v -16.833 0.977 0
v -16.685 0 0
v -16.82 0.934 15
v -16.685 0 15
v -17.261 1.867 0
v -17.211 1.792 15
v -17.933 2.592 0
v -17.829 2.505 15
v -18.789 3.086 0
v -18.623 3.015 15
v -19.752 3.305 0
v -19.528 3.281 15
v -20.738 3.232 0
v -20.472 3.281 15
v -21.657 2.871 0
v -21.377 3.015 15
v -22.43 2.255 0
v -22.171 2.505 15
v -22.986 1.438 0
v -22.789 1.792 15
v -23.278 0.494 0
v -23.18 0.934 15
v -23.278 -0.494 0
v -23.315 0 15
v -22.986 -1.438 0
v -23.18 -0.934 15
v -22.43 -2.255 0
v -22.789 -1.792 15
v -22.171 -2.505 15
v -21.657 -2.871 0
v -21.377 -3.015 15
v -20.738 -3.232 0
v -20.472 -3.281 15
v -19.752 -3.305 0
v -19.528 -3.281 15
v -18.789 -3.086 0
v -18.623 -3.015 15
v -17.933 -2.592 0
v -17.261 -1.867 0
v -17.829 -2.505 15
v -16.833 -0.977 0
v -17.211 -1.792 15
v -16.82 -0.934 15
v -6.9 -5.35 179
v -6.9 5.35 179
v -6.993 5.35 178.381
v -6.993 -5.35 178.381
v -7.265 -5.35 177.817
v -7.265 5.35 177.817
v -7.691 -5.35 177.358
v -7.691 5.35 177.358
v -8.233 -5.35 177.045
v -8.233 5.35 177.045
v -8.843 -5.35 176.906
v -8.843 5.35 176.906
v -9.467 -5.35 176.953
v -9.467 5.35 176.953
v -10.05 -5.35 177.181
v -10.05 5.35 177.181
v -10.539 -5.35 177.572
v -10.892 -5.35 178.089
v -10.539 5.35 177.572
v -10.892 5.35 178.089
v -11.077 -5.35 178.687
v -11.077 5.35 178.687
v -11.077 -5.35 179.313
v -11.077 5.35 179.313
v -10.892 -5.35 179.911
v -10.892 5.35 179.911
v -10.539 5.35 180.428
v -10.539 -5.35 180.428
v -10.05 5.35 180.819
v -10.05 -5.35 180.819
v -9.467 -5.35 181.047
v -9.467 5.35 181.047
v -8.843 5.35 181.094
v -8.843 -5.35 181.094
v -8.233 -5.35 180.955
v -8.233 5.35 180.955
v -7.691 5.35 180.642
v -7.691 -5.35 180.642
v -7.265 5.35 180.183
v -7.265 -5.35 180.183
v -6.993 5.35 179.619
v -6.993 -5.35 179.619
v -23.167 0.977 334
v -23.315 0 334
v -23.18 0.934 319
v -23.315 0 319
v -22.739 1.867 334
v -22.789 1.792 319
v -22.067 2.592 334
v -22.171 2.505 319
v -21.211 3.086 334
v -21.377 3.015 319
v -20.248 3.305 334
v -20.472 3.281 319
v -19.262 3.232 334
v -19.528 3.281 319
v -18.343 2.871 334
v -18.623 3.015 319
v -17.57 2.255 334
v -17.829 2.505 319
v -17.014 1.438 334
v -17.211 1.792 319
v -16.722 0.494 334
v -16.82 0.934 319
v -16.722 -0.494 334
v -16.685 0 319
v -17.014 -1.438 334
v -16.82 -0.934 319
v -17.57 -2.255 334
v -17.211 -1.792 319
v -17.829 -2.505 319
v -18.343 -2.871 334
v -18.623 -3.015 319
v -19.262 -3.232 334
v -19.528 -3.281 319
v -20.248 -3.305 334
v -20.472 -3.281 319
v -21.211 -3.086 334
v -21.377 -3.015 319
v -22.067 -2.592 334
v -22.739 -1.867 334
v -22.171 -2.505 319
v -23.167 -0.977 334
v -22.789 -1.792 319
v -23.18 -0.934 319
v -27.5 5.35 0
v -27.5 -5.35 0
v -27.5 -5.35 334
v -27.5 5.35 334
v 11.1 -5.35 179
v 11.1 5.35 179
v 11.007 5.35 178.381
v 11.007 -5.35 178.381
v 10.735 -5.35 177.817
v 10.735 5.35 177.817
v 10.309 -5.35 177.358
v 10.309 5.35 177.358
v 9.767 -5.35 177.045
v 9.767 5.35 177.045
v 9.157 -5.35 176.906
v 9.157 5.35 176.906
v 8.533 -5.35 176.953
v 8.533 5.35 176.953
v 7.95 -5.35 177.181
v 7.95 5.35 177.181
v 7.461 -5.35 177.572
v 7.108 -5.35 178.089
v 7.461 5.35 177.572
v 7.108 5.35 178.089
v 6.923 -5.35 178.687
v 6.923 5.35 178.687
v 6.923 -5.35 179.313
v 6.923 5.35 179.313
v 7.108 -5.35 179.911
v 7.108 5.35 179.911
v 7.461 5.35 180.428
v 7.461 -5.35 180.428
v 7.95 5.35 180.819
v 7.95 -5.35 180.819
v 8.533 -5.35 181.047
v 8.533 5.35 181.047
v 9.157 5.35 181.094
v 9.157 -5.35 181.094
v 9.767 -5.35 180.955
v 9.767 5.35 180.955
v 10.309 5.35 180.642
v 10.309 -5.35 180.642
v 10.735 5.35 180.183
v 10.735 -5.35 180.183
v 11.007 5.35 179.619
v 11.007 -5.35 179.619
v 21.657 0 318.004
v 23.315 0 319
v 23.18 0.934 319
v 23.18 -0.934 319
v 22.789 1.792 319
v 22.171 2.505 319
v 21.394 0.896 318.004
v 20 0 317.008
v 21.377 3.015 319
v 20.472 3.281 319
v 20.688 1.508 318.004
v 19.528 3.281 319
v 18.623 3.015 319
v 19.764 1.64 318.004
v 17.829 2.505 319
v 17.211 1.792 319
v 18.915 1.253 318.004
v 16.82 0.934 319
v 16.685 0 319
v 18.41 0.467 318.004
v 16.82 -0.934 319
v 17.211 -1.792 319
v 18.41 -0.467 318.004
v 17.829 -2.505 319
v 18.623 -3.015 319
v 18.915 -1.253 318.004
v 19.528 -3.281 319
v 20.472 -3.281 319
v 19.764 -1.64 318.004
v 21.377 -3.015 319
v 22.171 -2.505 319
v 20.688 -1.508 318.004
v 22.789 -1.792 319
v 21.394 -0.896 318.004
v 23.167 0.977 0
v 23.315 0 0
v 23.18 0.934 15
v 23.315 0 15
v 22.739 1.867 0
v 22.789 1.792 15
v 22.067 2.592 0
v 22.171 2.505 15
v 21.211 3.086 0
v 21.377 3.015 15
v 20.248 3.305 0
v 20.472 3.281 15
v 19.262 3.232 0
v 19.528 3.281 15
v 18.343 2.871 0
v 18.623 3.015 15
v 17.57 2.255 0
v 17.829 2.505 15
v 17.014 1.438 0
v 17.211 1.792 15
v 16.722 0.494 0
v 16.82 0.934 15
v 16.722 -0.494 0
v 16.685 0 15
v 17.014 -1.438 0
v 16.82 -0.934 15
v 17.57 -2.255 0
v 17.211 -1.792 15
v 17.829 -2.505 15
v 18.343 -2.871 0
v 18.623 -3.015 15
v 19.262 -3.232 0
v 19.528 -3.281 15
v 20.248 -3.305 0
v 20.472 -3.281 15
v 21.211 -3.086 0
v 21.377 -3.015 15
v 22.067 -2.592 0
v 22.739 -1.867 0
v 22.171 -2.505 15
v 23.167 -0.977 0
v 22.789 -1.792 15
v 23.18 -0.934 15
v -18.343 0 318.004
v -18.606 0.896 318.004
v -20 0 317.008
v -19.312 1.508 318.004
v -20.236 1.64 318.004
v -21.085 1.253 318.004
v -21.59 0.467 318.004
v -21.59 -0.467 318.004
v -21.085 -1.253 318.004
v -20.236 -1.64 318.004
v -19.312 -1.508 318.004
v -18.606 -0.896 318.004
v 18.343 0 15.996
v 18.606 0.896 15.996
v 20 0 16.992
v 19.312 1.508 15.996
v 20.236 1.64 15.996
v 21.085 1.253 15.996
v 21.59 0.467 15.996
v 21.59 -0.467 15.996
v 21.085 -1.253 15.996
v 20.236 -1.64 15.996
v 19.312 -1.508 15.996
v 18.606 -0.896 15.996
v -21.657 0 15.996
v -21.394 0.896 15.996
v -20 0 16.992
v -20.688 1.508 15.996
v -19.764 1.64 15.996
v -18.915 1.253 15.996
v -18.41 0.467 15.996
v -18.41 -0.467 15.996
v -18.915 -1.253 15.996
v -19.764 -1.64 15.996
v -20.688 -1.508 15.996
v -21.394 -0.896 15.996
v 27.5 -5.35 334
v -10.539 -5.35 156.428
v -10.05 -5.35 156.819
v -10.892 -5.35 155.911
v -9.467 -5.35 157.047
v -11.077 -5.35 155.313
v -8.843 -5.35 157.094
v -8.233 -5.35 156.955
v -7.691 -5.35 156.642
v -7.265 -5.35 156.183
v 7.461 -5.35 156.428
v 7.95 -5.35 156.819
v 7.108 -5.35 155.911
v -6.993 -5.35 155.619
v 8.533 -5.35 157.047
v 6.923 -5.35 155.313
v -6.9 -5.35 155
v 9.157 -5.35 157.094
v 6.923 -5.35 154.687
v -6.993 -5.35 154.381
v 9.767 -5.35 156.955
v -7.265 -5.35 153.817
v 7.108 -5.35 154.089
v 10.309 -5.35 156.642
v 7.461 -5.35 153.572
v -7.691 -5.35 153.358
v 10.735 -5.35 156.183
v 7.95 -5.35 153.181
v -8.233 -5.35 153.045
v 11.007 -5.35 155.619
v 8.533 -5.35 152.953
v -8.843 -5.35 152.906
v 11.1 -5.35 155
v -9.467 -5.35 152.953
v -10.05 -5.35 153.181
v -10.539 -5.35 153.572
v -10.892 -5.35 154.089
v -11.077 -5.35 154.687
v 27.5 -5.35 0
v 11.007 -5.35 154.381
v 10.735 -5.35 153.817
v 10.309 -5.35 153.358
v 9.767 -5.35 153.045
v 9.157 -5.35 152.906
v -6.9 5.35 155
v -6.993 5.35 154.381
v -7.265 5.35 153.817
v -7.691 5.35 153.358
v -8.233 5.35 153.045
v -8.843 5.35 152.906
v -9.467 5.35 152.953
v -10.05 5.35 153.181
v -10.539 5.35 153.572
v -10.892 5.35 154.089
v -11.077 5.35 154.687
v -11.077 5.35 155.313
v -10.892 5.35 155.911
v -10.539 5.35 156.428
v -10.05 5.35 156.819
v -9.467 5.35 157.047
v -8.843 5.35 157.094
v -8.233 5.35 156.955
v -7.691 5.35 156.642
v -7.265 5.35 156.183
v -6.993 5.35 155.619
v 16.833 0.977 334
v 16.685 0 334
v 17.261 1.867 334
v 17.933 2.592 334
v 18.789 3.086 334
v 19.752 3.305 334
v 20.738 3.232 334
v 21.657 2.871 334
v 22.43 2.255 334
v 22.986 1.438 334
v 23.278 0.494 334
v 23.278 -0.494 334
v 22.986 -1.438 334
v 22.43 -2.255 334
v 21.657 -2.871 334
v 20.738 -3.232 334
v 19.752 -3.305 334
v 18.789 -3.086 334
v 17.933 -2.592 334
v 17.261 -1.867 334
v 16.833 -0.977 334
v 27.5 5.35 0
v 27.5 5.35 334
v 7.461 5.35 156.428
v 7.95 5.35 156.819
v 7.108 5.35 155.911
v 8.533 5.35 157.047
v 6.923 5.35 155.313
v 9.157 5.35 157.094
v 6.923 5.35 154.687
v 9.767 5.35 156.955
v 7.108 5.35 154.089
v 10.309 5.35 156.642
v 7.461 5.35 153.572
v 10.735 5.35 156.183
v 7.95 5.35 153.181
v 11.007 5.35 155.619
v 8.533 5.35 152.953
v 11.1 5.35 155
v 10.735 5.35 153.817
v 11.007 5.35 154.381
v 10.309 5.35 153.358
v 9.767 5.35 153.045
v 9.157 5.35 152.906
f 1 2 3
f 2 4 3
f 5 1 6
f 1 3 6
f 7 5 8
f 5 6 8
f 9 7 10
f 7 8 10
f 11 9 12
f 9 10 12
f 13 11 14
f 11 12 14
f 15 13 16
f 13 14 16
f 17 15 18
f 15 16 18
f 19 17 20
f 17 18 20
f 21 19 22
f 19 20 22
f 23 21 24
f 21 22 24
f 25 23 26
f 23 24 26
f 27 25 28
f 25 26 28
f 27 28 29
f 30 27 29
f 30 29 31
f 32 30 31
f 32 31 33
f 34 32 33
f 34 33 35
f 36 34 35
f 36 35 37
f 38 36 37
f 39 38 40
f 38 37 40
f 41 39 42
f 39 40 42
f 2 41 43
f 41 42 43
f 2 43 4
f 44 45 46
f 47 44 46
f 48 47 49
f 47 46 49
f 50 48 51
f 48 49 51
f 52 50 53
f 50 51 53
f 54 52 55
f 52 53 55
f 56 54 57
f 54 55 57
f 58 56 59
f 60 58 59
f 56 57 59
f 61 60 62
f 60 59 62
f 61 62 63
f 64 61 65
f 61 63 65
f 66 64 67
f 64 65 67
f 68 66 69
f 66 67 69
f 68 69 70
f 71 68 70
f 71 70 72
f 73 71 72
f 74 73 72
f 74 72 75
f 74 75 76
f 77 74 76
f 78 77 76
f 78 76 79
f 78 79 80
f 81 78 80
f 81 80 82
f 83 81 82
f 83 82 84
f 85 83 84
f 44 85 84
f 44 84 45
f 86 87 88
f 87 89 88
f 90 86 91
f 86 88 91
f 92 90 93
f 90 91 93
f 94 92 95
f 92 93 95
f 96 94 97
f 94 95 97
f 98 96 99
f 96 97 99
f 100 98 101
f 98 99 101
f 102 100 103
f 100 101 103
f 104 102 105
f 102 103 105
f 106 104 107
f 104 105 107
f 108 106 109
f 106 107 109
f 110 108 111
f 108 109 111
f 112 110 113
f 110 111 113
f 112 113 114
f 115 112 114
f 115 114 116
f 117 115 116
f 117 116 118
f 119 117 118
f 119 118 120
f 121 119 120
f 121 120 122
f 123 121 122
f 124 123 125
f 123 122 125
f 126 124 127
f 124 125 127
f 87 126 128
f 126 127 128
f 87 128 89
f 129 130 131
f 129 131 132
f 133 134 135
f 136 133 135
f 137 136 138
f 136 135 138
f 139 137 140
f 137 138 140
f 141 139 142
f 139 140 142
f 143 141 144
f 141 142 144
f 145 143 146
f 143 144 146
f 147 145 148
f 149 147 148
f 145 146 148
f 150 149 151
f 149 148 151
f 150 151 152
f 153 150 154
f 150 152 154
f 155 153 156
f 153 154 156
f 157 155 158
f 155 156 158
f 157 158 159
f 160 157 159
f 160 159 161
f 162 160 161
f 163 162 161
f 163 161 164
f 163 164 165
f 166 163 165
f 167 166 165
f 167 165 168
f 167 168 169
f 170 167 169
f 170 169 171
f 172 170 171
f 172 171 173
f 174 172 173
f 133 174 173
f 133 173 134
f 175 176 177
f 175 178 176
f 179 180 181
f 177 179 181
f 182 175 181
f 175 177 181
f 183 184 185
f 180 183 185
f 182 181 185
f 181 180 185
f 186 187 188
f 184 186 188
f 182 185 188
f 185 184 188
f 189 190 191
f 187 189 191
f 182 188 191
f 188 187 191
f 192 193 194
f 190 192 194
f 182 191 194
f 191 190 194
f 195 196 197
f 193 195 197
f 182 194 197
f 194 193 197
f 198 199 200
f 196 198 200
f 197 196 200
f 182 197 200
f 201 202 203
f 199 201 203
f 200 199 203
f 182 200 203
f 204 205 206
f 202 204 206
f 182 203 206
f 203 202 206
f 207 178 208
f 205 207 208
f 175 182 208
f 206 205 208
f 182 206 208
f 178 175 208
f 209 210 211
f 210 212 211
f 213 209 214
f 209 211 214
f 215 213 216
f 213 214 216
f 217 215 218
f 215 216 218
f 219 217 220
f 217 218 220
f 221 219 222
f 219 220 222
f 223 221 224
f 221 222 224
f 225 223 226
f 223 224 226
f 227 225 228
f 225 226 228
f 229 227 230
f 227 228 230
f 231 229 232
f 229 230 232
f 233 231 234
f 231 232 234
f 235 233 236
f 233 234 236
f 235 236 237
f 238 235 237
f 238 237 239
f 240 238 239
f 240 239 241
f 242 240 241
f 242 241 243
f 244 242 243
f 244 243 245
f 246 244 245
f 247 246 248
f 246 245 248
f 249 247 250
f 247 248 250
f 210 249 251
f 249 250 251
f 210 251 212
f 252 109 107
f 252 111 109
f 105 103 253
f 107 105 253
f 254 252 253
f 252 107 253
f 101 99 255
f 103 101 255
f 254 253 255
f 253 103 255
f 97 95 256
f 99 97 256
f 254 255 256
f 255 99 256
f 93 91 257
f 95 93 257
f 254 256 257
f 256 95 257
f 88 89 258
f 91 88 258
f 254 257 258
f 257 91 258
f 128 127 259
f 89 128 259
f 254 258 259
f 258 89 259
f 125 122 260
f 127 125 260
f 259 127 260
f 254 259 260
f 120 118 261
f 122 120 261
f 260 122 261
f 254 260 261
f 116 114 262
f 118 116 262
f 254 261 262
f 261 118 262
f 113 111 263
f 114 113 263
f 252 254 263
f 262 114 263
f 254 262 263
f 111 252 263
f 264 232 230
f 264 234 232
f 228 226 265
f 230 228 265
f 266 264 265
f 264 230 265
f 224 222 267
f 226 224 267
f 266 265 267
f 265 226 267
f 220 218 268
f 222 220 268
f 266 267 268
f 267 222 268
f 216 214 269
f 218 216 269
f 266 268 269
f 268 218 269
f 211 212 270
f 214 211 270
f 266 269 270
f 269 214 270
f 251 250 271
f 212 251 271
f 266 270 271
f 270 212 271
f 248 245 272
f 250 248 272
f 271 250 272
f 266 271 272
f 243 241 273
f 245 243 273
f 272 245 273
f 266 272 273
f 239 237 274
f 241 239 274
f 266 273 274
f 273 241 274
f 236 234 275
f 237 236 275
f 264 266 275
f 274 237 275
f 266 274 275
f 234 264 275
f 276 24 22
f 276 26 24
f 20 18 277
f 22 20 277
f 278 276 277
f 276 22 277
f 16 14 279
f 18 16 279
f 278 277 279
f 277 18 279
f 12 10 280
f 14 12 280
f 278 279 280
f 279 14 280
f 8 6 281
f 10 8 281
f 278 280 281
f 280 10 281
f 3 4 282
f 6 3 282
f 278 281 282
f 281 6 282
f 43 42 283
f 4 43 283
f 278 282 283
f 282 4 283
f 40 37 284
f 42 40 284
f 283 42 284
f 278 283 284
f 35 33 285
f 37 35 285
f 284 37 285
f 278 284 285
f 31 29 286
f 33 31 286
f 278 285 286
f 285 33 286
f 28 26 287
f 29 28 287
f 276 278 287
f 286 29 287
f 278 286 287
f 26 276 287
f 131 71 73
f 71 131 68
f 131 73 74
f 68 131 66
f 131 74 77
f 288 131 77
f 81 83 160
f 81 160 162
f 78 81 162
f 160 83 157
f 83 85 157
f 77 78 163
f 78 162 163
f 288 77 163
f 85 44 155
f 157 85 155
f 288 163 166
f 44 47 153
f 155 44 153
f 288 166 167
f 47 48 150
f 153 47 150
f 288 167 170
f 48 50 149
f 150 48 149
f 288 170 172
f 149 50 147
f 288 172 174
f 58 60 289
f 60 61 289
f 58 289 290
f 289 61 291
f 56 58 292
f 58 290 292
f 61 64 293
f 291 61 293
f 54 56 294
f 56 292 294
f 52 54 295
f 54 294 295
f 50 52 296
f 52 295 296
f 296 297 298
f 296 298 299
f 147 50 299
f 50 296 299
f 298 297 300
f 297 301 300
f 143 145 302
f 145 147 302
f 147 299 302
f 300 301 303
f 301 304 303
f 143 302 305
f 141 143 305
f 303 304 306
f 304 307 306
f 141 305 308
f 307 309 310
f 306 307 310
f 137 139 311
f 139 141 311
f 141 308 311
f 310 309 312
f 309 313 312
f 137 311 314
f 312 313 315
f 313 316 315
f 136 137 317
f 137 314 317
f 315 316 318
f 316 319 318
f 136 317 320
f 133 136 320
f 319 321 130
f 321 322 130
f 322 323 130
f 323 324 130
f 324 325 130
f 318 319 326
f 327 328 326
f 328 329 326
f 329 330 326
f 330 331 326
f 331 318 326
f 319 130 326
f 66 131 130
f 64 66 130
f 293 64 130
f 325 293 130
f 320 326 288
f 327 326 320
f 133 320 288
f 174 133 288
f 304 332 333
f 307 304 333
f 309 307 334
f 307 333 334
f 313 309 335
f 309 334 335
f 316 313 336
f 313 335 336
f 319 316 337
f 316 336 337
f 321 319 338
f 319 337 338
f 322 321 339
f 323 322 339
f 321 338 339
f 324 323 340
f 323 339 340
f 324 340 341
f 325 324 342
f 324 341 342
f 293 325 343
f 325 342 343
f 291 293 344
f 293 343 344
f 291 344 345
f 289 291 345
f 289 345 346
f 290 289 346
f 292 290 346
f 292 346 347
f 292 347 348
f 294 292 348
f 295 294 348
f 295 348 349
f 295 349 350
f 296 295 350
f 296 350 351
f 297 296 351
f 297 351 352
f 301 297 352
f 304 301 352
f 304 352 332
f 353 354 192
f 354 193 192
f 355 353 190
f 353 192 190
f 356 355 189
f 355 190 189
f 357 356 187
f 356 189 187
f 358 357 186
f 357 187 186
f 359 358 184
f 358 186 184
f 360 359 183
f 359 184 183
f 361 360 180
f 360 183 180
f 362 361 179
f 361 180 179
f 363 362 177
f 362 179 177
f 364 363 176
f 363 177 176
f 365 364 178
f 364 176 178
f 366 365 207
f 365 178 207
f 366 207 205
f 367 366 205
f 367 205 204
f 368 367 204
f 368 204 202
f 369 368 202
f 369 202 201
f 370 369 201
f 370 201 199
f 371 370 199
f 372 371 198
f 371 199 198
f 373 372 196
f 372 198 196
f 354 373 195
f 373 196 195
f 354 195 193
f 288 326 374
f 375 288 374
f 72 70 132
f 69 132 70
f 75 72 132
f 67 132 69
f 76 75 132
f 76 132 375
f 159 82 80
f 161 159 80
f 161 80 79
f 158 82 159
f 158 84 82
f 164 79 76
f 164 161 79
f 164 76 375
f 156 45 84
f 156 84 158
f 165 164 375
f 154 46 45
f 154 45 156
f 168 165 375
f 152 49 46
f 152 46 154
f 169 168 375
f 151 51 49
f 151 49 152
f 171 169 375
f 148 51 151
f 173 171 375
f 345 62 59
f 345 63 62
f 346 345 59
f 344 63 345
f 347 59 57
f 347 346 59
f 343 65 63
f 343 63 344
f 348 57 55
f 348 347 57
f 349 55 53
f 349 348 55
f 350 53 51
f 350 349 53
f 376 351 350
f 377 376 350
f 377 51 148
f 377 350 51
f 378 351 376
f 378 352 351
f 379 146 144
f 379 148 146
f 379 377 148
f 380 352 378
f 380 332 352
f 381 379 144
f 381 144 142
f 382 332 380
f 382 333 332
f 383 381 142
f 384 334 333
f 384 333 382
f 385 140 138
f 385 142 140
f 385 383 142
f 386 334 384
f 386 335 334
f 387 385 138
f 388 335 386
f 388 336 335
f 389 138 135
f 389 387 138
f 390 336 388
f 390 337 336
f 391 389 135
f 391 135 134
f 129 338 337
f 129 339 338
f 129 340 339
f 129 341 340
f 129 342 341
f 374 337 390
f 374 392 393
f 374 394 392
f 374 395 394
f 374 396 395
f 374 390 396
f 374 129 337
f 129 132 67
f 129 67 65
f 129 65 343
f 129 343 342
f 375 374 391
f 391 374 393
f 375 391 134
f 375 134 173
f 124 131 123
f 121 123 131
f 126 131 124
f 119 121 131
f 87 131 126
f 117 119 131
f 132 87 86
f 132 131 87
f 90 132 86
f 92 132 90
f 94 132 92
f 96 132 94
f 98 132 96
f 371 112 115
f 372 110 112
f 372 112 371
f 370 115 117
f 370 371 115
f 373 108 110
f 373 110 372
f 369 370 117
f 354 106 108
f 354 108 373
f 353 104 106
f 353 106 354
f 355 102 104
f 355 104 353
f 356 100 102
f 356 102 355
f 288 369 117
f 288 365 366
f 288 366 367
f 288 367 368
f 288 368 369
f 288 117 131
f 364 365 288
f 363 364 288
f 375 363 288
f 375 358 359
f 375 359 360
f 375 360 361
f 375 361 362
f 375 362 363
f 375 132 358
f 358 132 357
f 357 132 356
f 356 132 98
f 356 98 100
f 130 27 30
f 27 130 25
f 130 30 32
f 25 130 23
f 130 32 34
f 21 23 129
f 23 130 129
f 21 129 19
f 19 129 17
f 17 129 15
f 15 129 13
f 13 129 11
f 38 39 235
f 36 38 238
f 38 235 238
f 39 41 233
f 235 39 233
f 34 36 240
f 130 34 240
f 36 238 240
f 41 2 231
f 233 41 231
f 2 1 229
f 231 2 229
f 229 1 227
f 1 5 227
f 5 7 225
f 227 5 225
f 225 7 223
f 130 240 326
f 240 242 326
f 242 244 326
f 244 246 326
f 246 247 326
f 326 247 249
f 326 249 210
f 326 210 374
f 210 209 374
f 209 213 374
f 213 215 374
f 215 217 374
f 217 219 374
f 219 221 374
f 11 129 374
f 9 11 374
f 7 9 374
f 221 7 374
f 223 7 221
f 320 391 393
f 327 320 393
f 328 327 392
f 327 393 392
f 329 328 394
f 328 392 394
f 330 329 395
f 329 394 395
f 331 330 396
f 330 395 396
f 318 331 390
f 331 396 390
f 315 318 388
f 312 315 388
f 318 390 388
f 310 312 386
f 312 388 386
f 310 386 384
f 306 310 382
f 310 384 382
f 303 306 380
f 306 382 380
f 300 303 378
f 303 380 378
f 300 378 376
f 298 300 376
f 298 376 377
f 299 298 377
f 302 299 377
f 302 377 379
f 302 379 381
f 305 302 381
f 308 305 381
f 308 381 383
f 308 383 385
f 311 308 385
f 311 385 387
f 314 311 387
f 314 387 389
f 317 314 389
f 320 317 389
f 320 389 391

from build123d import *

# Parameters (mm, degrees)
ESBO_O1_W                                   = 55
ESBO_O1_H                                   = 10.7
RESSALTO_EXTRUS_O1_DEPTH                    = 334
FURO_ROSCADO_PARA_CONDU_TE_DE_M4X0_71_D     = 4.2
FURO_ROSCADO_PARA_CONDU_TE_DE_1_4_281_D     = 6.6294
FURO_ROSCADO_PARA_CONDU_TE_DE_1_4_281_DEPTH = 15
FURO_ROSCADO_PARA_CONDU_TE_DE_1_4_281_TIP   = 1.991672694
FURO_ROSCADO_PARA_CONDU_TE_DE_1_4_282_D     = 6.6294
FURO_ROSCADO_PARA_CONDU_TE_DE_1_4_282_DEPTH = 15
FURO_ROSCADO_PARA_CONDU_TE_DE_1_4_282_TIP   = 1.991672694


with BuildPart() as part:
    # Esboço1 → Ressalto-extrusão1 (new body)
    with BuildSketch(Plane.XY):
        Rectangle(ESBO_O1_W, ESBO_O1_H)
    extrude(amount=RESSALTO_EXTRUS_O1_DEPTH)

    # Furo roscado para conduíte de M4x0.71 (through all)
    with Locations(Plane(origin=(0, -5.35, 0), x_dir=(-1, 0, 0), z_dir=(0, -1, 0))):
        with Locations((9, -155), (-9, -155), (-9, -179), (9, -179)):
            Hole(FURO_ROSCADO_PARA_CONDU_TE_DE_M4X0_71_D / 2)

    # Furo roscado para conduíte de 1/4-281
    with Locations(Plane.XY.offset(334)):
        with Locations((-20, 0), (20, 0)):
            Hole(FURO_ROSCADO_PARA_CONDU_TE_DE_1_4_281_D / 2, depth=FURO_ROSCADO_PARA_CONDU_TE_DE_1_4_281_DEPTH)
            with Locations((0, 0, -(FURO_ROSCADO_PARA_CONDU_TE_DE_1_4_281_DEPTH + FURO_ROSCADO_PARA_CONDU_TE_DE_1_4_281_TIP / 2))):  # 118° drill point
                Cone(0, FURO_ROSCADO_PARA_CONDU_TE_DE_1_4_281_D / 2, FURO_ROSCADO_PARA_CONDU_TE_DE_1_4_281_TIP, mode=Mode.SUBTRACT)

    # Furo roscado para conduíte de 1/4-282
    with Locations(Plane(origin=(0, 0, 0), x_dir=(-1, 0, 0), z_dir=(0, 0, -1))):
        with Locations((-20, 0), (20, 0)):
            Hole(FURO_ROSCADO_PARA_CONDU_TE_DE_1_4_282_D / 2, depth=FURO_ROSCADO_PARA_CONDU_TE_DE_1_4_282_DEPTH)
            with Locations((0, 0, -(FURO_ROSCADO_PARA_CONDU_TE_DE_1_4_282_DEPTH + FURO_ROSCADO_PARA_CONDU_TE_DE_1_4_282_TIP / 2))):  # 118° drill point
                Cone(0, FURO_ROSCADO_PARA_CONDU_TE_DE_1_4_282_D / 2, FURO_ROSCADO_PARA_CONDU_TE_DE_1_4_282_TIP, mode=Mode.SUBTRACT)


solid = part.part
